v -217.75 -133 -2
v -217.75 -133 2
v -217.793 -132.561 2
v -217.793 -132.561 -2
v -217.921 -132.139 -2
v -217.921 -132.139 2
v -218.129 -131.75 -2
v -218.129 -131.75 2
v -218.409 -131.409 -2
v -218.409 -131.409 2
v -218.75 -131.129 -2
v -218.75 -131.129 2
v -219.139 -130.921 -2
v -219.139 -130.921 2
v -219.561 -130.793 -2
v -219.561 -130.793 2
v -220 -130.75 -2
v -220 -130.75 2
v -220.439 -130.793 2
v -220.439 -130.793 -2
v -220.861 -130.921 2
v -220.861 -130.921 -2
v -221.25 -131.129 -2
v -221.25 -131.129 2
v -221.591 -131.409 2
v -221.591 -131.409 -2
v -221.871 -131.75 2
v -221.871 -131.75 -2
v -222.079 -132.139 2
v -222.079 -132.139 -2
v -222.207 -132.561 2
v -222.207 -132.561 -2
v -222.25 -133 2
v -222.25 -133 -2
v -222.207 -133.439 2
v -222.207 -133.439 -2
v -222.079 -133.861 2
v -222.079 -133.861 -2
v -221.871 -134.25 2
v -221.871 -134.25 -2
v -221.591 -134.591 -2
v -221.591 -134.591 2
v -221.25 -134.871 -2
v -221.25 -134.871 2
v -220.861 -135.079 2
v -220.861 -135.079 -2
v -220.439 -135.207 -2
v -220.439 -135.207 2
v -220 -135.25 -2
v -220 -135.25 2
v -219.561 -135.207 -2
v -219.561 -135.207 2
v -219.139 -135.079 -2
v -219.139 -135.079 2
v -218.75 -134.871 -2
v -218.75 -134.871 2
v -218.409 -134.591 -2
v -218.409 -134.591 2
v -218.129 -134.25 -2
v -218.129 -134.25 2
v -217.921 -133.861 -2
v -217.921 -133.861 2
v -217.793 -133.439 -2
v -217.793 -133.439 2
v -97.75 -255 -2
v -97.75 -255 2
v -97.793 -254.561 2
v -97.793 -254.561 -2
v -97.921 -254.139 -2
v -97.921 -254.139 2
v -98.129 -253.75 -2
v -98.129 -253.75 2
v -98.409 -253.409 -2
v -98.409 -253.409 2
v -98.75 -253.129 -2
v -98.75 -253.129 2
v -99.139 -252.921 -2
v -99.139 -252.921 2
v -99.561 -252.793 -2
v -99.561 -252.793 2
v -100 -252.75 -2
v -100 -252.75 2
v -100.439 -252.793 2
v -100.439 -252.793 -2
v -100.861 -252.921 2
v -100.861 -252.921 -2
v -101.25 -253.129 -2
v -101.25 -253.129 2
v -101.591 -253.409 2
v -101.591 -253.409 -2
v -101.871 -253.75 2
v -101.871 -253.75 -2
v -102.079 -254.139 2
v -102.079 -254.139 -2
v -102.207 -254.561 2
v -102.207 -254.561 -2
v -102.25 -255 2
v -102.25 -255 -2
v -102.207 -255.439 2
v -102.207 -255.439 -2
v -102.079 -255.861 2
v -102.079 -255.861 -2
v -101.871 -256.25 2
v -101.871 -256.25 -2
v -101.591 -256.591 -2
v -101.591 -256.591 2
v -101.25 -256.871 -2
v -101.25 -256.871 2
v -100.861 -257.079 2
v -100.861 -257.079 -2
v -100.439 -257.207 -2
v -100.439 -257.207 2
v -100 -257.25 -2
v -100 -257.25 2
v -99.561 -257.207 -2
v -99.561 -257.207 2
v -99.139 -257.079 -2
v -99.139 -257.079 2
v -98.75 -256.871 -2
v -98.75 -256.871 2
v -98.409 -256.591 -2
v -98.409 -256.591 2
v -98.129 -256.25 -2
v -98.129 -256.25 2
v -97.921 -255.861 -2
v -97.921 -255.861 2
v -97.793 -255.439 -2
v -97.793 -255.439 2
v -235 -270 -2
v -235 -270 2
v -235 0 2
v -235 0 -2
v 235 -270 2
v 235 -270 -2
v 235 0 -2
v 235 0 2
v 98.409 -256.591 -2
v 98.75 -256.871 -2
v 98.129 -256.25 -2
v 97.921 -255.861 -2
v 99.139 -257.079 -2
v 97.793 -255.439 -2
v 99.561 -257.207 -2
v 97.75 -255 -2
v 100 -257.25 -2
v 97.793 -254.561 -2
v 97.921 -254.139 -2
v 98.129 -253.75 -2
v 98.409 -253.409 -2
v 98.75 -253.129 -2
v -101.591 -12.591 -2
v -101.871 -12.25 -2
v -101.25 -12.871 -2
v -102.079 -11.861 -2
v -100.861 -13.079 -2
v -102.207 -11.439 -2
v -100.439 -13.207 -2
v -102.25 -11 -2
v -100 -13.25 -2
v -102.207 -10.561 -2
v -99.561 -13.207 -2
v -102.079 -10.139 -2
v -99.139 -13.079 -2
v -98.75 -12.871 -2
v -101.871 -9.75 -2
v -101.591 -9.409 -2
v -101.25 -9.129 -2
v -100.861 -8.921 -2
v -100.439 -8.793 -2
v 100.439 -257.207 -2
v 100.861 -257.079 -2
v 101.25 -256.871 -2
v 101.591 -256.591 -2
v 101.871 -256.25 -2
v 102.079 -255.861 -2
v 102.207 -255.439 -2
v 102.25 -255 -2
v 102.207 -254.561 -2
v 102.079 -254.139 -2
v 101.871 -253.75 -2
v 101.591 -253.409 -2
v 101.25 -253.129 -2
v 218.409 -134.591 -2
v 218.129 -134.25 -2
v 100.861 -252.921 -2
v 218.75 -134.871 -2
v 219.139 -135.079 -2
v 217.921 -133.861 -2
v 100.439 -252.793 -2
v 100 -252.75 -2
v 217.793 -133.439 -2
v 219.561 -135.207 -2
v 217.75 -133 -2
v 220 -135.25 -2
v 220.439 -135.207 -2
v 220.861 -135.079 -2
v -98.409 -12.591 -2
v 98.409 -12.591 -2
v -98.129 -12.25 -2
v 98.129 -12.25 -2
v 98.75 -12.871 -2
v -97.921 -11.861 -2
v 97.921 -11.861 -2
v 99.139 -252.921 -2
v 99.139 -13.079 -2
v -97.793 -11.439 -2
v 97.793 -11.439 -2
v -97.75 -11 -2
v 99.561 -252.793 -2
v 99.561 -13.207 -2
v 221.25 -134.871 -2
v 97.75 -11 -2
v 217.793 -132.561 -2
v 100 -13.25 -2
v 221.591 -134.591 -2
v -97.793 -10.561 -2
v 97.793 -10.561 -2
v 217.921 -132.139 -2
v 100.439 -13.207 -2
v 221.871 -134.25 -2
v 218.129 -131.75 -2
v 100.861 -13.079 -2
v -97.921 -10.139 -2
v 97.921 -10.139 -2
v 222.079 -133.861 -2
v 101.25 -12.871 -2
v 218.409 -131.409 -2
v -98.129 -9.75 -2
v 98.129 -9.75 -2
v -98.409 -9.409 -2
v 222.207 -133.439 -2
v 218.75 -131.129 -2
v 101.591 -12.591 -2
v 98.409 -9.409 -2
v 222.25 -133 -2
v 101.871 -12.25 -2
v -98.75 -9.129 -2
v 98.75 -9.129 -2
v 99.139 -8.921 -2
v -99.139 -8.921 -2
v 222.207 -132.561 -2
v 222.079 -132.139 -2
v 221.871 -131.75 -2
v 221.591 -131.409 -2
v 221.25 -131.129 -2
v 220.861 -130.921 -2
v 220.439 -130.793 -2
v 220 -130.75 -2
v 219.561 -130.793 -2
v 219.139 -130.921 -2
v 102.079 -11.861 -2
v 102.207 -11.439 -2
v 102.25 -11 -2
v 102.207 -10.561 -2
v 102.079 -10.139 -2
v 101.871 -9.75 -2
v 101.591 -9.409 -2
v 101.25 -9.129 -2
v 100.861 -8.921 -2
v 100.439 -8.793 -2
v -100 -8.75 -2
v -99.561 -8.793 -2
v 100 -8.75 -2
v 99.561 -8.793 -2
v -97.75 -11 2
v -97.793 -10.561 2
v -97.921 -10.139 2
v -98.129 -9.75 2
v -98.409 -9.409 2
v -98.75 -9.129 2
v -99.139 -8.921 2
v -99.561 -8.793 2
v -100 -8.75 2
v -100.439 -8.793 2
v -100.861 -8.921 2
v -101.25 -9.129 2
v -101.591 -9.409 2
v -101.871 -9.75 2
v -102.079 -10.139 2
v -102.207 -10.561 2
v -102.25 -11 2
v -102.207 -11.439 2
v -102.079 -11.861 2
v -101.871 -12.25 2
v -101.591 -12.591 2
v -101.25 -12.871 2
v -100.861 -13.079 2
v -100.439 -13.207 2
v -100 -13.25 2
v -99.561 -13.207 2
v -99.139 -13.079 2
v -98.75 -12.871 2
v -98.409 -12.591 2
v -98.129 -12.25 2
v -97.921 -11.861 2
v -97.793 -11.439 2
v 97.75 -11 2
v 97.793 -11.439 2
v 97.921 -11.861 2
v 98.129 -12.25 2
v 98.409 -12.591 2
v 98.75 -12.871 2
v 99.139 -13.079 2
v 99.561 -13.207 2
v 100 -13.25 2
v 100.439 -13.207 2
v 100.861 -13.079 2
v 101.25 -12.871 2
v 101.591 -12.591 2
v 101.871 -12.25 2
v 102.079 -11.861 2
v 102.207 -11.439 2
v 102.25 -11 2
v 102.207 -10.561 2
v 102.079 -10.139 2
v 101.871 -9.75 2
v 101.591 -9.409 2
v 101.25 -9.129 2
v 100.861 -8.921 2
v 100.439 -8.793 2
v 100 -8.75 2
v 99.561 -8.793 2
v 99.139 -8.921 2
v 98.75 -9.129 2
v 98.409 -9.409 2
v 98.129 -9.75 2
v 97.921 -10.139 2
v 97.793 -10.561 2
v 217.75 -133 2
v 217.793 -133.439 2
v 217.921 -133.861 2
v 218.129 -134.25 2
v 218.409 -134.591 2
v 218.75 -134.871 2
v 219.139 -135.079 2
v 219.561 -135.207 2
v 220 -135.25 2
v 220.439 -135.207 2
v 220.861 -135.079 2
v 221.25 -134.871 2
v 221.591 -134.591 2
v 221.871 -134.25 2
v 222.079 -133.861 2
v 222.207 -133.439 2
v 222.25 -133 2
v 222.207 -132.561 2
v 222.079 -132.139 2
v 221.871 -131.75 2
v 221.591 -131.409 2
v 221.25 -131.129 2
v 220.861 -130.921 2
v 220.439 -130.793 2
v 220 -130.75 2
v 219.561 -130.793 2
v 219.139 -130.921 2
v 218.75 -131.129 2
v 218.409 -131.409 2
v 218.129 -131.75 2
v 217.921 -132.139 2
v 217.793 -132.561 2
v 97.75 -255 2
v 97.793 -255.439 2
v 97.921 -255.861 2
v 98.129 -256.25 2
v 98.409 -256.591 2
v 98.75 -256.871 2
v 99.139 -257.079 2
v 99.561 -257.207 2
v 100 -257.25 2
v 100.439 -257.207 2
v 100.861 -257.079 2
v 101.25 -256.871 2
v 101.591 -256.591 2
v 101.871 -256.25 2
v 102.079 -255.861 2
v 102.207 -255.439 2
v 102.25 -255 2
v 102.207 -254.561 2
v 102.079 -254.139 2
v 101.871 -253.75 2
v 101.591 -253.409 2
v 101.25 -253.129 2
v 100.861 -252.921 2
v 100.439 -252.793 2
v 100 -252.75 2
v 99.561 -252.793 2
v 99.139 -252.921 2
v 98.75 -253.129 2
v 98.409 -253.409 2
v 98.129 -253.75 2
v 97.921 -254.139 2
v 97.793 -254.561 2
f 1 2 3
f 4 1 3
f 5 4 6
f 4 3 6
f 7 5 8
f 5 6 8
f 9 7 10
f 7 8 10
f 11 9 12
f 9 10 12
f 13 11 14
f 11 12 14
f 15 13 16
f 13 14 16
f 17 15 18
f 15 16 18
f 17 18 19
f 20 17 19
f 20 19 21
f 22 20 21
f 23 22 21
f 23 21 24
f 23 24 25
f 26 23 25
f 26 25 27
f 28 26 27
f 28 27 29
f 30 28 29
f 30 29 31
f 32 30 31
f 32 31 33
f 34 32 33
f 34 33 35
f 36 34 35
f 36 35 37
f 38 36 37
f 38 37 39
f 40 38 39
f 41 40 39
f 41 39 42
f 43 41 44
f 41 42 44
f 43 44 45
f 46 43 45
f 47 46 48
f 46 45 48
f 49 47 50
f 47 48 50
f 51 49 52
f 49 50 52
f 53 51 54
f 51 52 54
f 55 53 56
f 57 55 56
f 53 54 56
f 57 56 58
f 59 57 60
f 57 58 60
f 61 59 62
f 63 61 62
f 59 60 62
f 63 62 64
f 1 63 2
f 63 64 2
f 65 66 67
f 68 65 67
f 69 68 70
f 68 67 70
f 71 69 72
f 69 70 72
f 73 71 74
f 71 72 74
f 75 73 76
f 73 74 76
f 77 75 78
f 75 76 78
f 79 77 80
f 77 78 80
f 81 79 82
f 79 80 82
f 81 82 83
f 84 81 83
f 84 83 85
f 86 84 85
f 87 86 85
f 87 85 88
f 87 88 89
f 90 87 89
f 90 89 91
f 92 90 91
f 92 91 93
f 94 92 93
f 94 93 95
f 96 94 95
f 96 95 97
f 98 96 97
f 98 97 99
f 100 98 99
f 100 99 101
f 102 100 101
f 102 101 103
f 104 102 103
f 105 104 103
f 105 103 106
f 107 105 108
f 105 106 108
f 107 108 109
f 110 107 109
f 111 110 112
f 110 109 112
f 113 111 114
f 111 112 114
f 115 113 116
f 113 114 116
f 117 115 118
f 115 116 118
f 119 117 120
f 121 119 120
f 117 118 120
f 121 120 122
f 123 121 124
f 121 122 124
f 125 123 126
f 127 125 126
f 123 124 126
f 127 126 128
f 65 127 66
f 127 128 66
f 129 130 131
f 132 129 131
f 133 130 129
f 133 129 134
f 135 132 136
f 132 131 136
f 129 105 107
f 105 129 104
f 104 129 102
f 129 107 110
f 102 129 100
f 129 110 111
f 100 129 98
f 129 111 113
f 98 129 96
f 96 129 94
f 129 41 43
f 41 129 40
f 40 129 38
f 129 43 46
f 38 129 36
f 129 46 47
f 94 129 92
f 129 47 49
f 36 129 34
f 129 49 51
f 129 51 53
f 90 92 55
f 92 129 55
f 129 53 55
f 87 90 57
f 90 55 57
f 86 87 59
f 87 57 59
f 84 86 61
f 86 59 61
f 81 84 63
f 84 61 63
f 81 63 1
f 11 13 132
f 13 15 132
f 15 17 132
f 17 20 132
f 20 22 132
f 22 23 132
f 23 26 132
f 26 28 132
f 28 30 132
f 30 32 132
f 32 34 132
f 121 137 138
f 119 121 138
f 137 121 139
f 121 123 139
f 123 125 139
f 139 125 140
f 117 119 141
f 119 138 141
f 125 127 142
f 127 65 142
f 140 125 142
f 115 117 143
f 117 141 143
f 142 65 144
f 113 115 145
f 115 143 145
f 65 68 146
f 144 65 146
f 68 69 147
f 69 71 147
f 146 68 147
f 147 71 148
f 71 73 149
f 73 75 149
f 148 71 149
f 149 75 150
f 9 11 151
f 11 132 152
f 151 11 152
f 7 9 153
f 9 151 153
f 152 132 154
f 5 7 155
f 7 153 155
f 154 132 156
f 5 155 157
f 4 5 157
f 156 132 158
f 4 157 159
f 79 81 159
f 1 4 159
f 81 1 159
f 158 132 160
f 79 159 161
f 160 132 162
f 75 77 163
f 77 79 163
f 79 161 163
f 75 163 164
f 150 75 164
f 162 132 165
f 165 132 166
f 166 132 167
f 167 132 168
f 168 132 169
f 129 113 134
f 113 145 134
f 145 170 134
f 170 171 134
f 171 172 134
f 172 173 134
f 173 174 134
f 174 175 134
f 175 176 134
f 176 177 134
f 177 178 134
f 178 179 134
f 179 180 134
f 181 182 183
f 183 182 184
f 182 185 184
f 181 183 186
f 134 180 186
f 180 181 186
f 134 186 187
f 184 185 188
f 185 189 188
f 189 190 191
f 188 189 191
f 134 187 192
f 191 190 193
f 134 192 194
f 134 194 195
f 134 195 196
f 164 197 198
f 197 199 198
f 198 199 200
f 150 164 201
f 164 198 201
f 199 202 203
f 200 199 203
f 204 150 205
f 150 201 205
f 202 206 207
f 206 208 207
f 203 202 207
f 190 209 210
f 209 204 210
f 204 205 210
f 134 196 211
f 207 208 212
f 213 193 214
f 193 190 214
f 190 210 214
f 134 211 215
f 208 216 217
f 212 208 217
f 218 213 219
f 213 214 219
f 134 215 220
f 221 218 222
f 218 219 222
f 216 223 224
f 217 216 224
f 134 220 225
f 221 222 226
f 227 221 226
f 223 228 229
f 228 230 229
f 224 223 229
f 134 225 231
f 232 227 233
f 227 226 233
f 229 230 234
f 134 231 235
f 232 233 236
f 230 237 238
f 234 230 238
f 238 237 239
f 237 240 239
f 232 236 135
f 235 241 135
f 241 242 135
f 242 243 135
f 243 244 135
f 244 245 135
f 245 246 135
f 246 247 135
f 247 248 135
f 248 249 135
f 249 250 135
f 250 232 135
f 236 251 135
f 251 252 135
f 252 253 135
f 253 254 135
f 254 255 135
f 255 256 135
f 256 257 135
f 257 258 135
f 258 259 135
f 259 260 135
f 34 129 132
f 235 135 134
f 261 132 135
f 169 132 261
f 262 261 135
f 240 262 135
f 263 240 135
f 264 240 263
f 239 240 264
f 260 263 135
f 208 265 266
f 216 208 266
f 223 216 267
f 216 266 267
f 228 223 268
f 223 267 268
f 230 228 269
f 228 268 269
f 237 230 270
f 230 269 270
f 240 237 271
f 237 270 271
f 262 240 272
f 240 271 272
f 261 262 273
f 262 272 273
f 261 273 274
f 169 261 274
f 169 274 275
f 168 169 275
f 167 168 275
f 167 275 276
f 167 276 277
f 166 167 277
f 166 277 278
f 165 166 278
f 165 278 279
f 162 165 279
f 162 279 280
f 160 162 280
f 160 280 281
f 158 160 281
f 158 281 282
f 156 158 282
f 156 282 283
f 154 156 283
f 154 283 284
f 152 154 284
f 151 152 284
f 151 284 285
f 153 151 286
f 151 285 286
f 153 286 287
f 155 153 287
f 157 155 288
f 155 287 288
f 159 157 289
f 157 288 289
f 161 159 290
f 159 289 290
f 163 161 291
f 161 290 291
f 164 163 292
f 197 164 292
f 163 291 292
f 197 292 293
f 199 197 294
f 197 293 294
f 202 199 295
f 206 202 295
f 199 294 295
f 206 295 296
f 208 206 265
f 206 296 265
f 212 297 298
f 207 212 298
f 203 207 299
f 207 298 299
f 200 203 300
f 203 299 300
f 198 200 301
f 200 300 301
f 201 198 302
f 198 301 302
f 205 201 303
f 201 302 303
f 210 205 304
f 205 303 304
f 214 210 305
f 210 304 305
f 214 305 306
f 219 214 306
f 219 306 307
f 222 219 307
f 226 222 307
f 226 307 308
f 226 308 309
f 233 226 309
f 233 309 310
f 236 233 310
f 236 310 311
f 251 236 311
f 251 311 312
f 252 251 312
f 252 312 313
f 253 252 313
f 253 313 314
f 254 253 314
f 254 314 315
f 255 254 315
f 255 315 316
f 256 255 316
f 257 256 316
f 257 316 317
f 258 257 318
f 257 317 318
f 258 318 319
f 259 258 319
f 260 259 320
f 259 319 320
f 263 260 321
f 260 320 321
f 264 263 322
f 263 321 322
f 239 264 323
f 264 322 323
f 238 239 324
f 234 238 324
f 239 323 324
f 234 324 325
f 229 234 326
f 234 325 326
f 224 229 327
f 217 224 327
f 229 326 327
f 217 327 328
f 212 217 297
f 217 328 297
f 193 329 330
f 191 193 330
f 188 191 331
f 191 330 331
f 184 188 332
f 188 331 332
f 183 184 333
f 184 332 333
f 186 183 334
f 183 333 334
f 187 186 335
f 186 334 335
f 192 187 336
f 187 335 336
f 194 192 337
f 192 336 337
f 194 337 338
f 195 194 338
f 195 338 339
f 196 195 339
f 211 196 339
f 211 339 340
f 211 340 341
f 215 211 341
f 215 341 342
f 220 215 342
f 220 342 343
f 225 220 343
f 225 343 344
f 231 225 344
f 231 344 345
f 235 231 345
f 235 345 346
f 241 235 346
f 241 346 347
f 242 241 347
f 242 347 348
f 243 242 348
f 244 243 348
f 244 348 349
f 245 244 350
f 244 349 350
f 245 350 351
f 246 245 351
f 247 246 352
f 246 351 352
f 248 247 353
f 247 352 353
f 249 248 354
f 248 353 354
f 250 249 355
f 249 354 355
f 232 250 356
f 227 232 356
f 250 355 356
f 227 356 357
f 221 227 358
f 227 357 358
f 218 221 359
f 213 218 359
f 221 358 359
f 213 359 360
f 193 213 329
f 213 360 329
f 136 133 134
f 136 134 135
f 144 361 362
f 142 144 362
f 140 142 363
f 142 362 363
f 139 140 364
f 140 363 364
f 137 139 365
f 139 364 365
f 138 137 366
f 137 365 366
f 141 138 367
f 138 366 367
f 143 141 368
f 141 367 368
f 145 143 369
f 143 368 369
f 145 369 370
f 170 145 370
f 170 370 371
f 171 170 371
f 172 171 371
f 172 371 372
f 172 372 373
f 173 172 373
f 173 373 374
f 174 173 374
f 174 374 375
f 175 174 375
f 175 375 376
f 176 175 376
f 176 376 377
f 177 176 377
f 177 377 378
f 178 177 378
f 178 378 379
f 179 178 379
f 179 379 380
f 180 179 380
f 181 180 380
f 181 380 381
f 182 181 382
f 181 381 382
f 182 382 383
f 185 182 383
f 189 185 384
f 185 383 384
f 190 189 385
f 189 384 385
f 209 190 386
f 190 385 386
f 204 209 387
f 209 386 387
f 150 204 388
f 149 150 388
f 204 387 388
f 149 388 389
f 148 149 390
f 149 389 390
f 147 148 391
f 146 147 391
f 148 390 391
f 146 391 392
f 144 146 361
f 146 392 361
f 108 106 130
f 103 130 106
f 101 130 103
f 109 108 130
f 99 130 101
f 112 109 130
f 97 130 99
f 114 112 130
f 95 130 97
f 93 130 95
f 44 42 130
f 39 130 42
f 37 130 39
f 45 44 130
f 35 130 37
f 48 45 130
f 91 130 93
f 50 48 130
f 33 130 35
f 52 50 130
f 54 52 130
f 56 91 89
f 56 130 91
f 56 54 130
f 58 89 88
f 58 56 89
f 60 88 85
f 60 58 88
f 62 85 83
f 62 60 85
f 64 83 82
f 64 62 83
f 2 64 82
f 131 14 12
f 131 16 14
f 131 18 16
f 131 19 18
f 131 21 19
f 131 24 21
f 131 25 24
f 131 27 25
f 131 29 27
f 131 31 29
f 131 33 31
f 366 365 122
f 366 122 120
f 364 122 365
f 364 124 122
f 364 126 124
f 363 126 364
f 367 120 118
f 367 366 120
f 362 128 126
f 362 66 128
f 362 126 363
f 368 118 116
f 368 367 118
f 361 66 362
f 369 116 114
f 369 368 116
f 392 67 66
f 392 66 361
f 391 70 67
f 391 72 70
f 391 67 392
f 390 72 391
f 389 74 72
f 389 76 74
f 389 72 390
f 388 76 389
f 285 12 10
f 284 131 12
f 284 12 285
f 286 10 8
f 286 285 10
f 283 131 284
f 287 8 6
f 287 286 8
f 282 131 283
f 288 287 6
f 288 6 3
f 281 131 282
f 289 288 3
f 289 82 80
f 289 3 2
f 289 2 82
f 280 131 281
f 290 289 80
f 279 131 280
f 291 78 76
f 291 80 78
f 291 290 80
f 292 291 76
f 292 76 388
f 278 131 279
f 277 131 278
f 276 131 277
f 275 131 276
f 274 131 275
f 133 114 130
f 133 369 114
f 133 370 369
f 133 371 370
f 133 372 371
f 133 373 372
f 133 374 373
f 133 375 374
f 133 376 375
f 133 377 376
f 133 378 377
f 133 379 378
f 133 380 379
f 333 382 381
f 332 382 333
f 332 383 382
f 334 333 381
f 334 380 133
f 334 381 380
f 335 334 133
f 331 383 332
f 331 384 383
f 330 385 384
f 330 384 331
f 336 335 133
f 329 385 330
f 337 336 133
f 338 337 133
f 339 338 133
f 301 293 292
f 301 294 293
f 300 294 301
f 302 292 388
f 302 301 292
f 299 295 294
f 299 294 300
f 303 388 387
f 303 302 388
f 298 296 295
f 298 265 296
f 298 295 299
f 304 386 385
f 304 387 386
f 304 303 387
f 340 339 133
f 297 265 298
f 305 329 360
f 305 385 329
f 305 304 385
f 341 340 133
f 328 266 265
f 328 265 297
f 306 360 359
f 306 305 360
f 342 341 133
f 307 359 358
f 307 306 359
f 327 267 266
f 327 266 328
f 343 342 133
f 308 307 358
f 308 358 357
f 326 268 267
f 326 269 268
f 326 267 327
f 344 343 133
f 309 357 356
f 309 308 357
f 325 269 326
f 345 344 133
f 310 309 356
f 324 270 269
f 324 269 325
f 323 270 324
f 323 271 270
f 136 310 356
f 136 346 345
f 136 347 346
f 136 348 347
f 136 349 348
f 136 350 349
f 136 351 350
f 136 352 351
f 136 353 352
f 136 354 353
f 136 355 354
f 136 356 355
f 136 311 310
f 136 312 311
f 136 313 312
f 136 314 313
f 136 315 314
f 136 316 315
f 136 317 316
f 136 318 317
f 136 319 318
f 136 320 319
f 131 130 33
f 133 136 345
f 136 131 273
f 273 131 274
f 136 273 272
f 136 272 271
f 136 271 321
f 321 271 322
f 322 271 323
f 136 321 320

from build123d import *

# Parameters (mm, degrees)
SKETCH1_W           = 470
SKETCH1_H           = 270
BOSS_EXTRUDE1_DEPTH = 2
SKETCH2_R           = 2.25
CUT_EXTRUDE1_DEPTH  = 358.967875654


with BuildPart() as part:
    # Sketch1 → Boss-Extrude1 (new, symmetric)
    with BuildSketch(Plane.XY):
        with Locations((0, -135)):
            Rectangle(SKETCH1_W, SKETCH1_H)
    extrude(amount=BOSS_EXTRUDE1_DEPTH, both=True)

    # Sketch2 → Cut-Extrude1 (cut, through all)
    with BuildSketch(Plane.XY.offset(2)):
        with Locations((-220, -133)):
            Circle(SKETCH2_R)
        with Locations((-100, -11)):
            Circle(SKETCH2_R)
        with Locations((-100, -255)):
            Circle(SKETCH2_R)
        with Locations(Location((220, -133, 0), (0, 0, 180))):
            Circle(SKETCH2_R)
        with Locations(Location((100, -255, 0), (0, 0, 180))):
            Circle(SKETCH2_R)
        with Locations(Location((100, -11, 0), (0, 0, 180))):
            Circle(SKETCH2_R)
    extrude(amount=-CUT_EXTRUDE1_DEPTH, mode=Mode.SUBTRACT)


solid = part.part
